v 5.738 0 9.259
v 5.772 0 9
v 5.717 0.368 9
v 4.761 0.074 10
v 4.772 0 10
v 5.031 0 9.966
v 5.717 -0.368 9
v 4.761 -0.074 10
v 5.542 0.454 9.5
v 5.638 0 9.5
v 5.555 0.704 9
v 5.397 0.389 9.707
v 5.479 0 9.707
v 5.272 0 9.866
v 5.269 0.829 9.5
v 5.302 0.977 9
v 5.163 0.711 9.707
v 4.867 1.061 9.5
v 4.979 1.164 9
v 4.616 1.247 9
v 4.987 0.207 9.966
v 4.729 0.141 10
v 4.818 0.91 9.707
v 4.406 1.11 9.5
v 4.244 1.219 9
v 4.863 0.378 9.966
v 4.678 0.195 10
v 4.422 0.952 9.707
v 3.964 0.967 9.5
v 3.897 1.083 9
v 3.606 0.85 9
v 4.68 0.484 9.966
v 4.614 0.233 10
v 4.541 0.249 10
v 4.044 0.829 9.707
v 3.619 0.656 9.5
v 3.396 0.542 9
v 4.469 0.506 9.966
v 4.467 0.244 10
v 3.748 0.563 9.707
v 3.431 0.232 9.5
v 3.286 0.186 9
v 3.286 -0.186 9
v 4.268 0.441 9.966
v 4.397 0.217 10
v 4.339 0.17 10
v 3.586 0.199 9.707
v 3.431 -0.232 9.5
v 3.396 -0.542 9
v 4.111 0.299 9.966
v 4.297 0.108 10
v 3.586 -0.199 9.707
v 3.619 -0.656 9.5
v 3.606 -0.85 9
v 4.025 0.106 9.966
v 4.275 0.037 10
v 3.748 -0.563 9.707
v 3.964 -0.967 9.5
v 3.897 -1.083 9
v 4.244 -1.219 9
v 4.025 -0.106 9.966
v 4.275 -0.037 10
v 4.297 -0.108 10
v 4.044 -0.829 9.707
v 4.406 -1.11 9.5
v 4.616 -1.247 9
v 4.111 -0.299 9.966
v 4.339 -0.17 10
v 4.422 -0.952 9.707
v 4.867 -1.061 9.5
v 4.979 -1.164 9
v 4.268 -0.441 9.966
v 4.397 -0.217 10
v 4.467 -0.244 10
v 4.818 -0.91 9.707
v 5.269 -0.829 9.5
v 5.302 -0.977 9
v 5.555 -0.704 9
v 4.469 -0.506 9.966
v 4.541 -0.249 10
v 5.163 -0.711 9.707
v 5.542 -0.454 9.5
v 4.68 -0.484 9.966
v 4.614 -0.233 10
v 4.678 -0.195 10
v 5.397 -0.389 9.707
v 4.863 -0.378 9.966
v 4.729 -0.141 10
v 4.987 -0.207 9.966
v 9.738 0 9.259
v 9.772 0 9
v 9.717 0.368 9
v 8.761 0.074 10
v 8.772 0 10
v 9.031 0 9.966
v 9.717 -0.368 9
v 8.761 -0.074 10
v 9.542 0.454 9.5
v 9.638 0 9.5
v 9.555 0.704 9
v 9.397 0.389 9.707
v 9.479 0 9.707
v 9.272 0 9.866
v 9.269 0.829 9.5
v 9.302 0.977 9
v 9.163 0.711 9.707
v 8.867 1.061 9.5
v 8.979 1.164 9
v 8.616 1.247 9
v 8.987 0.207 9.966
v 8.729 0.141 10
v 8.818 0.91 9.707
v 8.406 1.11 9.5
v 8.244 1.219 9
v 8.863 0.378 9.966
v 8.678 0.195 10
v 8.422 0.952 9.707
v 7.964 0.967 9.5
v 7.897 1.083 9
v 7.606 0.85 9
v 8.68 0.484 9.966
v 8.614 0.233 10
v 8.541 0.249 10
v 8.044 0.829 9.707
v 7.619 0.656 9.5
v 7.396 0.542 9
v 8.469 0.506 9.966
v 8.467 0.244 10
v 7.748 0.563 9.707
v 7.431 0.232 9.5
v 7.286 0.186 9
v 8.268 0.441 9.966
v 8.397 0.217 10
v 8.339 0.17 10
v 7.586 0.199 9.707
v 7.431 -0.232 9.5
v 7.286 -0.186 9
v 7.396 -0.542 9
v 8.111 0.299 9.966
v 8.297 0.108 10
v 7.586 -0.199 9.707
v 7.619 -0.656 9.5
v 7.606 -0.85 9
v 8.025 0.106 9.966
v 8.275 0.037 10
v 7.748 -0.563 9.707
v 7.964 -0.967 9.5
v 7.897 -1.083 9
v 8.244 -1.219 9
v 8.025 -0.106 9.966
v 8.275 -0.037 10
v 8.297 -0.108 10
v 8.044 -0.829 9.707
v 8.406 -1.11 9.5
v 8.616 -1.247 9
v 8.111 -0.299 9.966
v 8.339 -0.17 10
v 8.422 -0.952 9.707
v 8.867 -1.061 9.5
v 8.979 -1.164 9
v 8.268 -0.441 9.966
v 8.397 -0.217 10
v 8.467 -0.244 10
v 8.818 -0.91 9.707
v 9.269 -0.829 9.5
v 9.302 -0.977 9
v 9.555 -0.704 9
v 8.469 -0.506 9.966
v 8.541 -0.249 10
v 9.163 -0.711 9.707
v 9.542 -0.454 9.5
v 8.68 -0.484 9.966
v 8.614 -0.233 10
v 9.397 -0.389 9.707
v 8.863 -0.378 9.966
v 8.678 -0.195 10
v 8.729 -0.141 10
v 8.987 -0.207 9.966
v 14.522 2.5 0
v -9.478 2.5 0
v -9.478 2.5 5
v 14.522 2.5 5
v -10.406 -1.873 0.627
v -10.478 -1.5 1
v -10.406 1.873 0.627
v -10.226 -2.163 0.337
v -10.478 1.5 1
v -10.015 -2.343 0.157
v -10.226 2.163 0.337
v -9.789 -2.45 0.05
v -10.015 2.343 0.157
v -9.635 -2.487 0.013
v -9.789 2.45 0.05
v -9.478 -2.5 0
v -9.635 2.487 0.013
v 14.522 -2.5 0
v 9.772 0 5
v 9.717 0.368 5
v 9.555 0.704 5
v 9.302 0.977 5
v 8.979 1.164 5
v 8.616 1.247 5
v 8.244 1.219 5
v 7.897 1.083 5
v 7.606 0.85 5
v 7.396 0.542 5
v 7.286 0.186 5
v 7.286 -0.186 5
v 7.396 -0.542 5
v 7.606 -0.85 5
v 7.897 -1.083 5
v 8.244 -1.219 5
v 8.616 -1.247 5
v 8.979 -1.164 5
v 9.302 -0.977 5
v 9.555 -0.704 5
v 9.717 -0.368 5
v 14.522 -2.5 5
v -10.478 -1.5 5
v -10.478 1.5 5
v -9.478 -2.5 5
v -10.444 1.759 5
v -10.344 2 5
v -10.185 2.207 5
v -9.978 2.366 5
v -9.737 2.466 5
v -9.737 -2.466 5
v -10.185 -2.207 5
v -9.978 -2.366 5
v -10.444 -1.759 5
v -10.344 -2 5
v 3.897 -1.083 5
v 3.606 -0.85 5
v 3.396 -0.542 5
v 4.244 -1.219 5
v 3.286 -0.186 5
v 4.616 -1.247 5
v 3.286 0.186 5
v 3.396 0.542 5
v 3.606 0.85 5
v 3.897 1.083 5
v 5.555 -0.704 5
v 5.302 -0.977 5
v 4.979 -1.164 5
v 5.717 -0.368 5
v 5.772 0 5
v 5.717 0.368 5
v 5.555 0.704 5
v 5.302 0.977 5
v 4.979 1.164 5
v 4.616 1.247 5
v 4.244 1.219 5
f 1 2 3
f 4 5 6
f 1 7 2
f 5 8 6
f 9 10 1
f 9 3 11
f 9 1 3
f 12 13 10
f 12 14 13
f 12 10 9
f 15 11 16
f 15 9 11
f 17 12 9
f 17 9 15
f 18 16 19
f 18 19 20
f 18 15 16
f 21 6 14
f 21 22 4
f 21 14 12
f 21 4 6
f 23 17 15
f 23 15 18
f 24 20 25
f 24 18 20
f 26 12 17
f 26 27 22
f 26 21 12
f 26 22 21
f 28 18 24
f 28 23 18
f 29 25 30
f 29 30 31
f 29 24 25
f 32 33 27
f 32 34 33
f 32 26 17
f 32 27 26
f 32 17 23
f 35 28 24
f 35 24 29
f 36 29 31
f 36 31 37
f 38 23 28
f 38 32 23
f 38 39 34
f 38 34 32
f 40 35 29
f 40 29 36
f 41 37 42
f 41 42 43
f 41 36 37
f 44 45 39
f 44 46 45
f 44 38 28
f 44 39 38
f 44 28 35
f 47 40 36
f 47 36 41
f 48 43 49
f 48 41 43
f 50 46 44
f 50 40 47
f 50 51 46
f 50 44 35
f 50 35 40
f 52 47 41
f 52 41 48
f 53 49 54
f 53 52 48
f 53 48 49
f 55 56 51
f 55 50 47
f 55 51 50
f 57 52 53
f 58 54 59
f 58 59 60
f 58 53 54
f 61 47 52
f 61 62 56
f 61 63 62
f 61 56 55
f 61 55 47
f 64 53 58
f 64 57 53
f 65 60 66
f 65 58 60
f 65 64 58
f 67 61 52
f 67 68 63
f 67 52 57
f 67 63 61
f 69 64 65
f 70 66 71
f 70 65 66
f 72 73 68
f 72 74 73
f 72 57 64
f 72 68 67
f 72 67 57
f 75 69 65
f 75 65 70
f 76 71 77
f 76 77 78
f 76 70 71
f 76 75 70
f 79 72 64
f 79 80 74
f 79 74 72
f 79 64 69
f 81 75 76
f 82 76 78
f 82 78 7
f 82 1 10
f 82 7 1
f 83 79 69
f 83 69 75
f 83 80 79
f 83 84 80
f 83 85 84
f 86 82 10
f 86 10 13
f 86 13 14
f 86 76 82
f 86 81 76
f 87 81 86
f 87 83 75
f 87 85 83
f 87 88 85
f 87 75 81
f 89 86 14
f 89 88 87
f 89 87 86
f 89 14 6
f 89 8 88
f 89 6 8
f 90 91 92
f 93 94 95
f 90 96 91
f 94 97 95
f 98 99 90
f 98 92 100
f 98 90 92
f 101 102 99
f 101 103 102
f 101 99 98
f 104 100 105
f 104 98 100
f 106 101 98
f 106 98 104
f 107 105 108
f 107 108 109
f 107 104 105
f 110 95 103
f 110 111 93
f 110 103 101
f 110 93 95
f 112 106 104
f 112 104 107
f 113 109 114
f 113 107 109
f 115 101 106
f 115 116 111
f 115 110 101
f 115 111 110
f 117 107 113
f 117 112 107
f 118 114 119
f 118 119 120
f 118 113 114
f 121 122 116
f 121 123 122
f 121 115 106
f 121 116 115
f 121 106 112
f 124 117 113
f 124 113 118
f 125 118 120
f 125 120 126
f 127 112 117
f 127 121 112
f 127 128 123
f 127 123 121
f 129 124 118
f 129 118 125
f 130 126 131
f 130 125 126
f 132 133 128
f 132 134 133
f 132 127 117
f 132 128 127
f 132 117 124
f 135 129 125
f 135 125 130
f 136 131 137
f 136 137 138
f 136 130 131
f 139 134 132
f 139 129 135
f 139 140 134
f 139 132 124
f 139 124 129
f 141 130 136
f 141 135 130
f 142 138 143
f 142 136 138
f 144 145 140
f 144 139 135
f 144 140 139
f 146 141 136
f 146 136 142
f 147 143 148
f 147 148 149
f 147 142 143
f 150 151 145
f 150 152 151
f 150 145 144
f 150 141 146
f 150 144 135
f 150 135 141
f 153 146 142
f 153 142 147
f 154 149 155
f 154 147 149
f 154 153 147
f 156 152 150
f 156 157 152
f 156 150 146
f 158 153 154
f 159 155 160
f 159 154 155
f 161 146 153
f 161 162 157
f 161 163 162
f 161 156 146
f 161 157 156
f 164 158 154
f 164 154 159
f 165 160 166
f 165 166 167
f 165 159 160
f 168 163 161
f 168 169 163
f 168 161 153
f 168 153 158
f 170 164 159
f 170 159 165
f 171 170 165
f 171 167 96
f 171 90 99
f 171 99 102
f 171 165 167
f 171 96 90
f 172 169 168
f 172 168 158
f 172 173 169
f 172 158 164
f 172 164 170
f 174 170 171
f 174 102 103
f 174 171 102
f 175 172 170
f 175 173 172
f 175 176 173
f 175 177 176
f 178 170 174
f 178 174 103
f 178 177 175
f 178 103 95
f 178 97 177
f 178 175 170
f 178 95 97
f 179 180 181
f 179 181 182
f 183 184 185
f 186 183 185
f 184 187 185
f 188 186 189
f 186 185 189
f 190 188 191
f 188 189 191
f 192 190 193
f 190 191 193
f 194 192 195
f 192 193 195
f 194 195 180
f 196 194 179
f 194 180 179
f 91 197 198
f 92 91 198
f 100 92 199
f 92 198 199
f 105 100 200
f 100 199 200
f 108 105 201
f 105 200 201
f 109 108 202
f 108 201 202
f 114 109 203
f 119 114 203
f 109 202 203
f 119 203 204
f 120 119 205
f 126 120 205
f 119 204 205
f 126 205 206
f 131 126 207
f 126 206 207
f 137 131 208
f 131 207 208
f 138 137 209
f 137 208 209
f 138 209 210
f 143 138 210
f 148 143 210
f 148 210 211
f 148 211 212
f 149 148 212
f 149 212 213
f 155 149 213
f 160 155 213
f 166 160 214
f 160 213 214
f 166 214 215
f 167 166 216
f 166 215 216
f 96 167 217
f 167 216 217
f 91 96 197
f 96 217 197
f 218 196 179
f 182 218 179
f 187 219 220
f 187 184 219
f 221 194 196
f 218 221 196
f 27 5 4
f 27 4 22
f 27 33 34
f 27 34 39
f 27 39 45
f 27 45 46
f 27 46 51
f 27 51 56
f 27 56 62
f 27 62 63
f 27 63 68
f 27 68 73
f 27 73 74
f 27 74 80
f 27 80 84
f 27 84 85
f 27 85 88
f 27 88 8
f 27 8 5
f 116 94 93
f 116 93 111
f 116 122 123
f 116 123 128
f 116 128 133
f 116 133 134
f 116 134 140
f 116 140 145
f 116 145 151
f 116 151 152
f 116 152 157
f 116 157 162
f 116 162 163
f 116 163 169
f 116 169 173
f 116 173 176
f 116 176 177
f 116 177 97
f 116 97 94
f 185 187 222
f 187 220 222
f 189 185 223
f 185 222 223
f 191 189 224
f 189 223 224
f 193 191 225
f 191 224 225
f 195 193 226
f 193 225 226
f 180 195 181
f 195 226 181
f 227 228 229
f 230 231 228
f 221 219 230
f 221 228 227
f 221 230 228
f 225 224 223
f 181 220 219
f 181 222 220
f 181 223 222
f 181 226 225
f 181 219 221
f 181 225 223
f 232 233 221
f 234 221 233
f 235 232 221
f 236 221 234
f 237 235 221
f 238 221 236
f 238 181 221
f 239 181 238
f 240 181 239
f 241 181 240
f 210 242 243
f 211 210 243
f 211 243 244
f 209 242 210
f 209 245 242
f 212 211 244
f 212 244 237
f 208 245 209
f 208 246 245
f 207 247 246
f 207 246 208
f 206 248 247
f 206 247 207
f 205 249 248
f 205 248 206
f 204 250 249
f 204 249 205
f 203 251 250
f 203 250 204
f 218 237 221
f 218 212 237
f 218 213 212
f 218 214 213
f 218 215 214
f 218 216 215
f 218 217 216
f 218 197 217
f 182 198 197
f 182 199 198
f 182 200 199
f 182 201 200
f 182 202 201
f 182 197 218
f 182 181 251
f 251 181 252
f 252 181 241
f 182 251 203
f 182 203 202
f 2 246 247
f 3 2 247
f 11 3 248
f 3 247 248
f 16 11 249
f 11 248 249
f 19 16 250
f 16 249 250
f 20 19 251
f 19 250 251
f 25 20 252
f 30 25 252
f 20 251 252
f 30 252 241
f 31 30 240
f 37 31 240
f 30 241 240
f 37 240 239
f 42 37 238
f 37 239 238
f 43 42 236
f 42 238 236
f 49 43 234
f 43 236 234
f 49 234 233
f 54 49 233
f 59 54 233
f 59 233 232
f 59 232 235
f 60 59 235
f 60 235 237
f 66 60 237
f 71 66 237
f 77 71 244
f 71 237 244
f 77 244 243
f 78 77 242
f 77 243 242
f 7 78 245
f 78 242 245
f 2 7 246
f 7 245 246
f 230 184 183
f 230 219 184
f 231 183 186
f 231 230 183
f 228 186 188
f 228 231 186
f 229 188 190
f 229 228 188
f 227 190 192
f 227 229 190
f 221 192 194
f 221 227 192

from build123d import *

# Parameters (mm, degrees)
F0_W     = 25
F0_H     = 5
F1_DEPTH = 5
F2_R     = 1.25
F3_DEPTH = 5
F4_R     = 1


with BuildPart() as f1:
    # F0 (on Top) → F1 (new body)
    with BuildSketch(Plane.XY):
        with Locations((2.022313, 0)):
            Rectangle(F0_W, F0_H)
    extrude(amount=F1_DEPTH)

    # F2 (on face) → F3 (join)
    with BuildSketch(Plane.XY.offset(5)):
        with Locations((4.522313, 0)):
            Circle(F2_R)
        with Locations((8.522313, 0)):
            Circle(F2_R)
    extrude(amount=F3_DEPTH)

    # F4
    f4_edges = [f1.edges().sort_by_distance(p)[0] for p in [
        (-10.477687, -2.5, 2.5),
        (-10.477687, 2.5, 2.5),
        (3.272313, 0, 10),
        (7.272313, 0, 10),
        (-10.477687, 0, 0),
    ]]
    fillet(f4_edges, radius=F4_R)


solid = f1.part
